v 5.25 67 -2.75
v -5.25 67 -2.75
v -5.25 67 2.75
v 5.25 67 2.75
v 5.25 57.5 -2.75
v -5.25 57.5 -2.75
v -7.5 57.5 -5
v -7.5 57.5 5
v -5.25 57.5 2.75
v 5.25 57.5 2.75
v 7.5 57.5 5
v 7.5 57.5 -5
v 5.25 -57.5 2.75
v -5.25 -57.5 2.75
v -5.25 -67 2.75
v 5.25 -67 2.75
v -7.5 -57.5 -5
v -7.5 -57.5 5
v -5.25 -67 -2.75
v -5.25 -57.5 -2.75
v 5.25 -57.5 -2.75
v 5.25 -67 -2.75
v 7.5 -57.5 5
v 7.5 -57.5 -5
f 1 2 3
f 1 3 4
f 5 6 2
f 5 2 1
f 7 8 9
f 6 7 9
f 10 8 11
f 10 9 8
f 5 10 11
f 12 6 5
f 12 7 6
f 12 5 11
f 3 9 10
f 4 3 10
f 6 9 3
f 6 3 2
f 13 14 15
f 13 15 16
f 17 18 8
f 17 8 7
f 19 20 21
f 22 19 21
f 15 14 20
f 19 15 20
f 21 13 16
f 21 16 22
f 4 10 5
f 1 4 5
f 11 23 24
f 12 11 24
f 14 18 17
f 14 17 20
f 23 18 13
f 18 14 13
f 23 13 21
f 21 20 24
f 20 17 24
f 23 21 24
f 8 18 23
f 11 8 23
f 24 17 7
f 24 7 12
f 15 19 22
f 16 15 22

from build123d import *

# Parameters (mm, degrees)
SKETCH1_W           = 15
SKETCH1_H           = 10
BOSS_EXTRUDE1_DEPTH = 57.5
SKETCH2_W           = 10.5
SKETCH2_H           = 5.5
BOSS_EXTRUDE2_DEPTH = 9.5


with BuildPart() as part:
    # Sketch1 → Boss-Extrude1 (new, symmetric)
    with BuildSketch(Plane(origin=(0, 0, 0), x_dir=(1, 0, 0), z_dir=(0, 1, 0))):
        Rectangle(SKETCH1_W, SKETCH1_H)
    extrude(amount=BOSS_EXTRUDE1_DEPTH, both=True)

    # Sketch2 → Boss-Extrude2 (add)
    with BuildSketch(Plane(origin=(0, 57.5, 0), x_dir=(1, 0, 0), z_dir=(0, 1, 0))):
        Rectangle(SKETCH2_W, SKETCH2_H)
    boss_extrude2 = extrude(amount=BOSS_EXTRUDE2_DEPTH)

    # Mirror1: Boss-Extrude2 across plane
    add(boss_extrude2.mirror(Plane.ZX))


solid = part.part
